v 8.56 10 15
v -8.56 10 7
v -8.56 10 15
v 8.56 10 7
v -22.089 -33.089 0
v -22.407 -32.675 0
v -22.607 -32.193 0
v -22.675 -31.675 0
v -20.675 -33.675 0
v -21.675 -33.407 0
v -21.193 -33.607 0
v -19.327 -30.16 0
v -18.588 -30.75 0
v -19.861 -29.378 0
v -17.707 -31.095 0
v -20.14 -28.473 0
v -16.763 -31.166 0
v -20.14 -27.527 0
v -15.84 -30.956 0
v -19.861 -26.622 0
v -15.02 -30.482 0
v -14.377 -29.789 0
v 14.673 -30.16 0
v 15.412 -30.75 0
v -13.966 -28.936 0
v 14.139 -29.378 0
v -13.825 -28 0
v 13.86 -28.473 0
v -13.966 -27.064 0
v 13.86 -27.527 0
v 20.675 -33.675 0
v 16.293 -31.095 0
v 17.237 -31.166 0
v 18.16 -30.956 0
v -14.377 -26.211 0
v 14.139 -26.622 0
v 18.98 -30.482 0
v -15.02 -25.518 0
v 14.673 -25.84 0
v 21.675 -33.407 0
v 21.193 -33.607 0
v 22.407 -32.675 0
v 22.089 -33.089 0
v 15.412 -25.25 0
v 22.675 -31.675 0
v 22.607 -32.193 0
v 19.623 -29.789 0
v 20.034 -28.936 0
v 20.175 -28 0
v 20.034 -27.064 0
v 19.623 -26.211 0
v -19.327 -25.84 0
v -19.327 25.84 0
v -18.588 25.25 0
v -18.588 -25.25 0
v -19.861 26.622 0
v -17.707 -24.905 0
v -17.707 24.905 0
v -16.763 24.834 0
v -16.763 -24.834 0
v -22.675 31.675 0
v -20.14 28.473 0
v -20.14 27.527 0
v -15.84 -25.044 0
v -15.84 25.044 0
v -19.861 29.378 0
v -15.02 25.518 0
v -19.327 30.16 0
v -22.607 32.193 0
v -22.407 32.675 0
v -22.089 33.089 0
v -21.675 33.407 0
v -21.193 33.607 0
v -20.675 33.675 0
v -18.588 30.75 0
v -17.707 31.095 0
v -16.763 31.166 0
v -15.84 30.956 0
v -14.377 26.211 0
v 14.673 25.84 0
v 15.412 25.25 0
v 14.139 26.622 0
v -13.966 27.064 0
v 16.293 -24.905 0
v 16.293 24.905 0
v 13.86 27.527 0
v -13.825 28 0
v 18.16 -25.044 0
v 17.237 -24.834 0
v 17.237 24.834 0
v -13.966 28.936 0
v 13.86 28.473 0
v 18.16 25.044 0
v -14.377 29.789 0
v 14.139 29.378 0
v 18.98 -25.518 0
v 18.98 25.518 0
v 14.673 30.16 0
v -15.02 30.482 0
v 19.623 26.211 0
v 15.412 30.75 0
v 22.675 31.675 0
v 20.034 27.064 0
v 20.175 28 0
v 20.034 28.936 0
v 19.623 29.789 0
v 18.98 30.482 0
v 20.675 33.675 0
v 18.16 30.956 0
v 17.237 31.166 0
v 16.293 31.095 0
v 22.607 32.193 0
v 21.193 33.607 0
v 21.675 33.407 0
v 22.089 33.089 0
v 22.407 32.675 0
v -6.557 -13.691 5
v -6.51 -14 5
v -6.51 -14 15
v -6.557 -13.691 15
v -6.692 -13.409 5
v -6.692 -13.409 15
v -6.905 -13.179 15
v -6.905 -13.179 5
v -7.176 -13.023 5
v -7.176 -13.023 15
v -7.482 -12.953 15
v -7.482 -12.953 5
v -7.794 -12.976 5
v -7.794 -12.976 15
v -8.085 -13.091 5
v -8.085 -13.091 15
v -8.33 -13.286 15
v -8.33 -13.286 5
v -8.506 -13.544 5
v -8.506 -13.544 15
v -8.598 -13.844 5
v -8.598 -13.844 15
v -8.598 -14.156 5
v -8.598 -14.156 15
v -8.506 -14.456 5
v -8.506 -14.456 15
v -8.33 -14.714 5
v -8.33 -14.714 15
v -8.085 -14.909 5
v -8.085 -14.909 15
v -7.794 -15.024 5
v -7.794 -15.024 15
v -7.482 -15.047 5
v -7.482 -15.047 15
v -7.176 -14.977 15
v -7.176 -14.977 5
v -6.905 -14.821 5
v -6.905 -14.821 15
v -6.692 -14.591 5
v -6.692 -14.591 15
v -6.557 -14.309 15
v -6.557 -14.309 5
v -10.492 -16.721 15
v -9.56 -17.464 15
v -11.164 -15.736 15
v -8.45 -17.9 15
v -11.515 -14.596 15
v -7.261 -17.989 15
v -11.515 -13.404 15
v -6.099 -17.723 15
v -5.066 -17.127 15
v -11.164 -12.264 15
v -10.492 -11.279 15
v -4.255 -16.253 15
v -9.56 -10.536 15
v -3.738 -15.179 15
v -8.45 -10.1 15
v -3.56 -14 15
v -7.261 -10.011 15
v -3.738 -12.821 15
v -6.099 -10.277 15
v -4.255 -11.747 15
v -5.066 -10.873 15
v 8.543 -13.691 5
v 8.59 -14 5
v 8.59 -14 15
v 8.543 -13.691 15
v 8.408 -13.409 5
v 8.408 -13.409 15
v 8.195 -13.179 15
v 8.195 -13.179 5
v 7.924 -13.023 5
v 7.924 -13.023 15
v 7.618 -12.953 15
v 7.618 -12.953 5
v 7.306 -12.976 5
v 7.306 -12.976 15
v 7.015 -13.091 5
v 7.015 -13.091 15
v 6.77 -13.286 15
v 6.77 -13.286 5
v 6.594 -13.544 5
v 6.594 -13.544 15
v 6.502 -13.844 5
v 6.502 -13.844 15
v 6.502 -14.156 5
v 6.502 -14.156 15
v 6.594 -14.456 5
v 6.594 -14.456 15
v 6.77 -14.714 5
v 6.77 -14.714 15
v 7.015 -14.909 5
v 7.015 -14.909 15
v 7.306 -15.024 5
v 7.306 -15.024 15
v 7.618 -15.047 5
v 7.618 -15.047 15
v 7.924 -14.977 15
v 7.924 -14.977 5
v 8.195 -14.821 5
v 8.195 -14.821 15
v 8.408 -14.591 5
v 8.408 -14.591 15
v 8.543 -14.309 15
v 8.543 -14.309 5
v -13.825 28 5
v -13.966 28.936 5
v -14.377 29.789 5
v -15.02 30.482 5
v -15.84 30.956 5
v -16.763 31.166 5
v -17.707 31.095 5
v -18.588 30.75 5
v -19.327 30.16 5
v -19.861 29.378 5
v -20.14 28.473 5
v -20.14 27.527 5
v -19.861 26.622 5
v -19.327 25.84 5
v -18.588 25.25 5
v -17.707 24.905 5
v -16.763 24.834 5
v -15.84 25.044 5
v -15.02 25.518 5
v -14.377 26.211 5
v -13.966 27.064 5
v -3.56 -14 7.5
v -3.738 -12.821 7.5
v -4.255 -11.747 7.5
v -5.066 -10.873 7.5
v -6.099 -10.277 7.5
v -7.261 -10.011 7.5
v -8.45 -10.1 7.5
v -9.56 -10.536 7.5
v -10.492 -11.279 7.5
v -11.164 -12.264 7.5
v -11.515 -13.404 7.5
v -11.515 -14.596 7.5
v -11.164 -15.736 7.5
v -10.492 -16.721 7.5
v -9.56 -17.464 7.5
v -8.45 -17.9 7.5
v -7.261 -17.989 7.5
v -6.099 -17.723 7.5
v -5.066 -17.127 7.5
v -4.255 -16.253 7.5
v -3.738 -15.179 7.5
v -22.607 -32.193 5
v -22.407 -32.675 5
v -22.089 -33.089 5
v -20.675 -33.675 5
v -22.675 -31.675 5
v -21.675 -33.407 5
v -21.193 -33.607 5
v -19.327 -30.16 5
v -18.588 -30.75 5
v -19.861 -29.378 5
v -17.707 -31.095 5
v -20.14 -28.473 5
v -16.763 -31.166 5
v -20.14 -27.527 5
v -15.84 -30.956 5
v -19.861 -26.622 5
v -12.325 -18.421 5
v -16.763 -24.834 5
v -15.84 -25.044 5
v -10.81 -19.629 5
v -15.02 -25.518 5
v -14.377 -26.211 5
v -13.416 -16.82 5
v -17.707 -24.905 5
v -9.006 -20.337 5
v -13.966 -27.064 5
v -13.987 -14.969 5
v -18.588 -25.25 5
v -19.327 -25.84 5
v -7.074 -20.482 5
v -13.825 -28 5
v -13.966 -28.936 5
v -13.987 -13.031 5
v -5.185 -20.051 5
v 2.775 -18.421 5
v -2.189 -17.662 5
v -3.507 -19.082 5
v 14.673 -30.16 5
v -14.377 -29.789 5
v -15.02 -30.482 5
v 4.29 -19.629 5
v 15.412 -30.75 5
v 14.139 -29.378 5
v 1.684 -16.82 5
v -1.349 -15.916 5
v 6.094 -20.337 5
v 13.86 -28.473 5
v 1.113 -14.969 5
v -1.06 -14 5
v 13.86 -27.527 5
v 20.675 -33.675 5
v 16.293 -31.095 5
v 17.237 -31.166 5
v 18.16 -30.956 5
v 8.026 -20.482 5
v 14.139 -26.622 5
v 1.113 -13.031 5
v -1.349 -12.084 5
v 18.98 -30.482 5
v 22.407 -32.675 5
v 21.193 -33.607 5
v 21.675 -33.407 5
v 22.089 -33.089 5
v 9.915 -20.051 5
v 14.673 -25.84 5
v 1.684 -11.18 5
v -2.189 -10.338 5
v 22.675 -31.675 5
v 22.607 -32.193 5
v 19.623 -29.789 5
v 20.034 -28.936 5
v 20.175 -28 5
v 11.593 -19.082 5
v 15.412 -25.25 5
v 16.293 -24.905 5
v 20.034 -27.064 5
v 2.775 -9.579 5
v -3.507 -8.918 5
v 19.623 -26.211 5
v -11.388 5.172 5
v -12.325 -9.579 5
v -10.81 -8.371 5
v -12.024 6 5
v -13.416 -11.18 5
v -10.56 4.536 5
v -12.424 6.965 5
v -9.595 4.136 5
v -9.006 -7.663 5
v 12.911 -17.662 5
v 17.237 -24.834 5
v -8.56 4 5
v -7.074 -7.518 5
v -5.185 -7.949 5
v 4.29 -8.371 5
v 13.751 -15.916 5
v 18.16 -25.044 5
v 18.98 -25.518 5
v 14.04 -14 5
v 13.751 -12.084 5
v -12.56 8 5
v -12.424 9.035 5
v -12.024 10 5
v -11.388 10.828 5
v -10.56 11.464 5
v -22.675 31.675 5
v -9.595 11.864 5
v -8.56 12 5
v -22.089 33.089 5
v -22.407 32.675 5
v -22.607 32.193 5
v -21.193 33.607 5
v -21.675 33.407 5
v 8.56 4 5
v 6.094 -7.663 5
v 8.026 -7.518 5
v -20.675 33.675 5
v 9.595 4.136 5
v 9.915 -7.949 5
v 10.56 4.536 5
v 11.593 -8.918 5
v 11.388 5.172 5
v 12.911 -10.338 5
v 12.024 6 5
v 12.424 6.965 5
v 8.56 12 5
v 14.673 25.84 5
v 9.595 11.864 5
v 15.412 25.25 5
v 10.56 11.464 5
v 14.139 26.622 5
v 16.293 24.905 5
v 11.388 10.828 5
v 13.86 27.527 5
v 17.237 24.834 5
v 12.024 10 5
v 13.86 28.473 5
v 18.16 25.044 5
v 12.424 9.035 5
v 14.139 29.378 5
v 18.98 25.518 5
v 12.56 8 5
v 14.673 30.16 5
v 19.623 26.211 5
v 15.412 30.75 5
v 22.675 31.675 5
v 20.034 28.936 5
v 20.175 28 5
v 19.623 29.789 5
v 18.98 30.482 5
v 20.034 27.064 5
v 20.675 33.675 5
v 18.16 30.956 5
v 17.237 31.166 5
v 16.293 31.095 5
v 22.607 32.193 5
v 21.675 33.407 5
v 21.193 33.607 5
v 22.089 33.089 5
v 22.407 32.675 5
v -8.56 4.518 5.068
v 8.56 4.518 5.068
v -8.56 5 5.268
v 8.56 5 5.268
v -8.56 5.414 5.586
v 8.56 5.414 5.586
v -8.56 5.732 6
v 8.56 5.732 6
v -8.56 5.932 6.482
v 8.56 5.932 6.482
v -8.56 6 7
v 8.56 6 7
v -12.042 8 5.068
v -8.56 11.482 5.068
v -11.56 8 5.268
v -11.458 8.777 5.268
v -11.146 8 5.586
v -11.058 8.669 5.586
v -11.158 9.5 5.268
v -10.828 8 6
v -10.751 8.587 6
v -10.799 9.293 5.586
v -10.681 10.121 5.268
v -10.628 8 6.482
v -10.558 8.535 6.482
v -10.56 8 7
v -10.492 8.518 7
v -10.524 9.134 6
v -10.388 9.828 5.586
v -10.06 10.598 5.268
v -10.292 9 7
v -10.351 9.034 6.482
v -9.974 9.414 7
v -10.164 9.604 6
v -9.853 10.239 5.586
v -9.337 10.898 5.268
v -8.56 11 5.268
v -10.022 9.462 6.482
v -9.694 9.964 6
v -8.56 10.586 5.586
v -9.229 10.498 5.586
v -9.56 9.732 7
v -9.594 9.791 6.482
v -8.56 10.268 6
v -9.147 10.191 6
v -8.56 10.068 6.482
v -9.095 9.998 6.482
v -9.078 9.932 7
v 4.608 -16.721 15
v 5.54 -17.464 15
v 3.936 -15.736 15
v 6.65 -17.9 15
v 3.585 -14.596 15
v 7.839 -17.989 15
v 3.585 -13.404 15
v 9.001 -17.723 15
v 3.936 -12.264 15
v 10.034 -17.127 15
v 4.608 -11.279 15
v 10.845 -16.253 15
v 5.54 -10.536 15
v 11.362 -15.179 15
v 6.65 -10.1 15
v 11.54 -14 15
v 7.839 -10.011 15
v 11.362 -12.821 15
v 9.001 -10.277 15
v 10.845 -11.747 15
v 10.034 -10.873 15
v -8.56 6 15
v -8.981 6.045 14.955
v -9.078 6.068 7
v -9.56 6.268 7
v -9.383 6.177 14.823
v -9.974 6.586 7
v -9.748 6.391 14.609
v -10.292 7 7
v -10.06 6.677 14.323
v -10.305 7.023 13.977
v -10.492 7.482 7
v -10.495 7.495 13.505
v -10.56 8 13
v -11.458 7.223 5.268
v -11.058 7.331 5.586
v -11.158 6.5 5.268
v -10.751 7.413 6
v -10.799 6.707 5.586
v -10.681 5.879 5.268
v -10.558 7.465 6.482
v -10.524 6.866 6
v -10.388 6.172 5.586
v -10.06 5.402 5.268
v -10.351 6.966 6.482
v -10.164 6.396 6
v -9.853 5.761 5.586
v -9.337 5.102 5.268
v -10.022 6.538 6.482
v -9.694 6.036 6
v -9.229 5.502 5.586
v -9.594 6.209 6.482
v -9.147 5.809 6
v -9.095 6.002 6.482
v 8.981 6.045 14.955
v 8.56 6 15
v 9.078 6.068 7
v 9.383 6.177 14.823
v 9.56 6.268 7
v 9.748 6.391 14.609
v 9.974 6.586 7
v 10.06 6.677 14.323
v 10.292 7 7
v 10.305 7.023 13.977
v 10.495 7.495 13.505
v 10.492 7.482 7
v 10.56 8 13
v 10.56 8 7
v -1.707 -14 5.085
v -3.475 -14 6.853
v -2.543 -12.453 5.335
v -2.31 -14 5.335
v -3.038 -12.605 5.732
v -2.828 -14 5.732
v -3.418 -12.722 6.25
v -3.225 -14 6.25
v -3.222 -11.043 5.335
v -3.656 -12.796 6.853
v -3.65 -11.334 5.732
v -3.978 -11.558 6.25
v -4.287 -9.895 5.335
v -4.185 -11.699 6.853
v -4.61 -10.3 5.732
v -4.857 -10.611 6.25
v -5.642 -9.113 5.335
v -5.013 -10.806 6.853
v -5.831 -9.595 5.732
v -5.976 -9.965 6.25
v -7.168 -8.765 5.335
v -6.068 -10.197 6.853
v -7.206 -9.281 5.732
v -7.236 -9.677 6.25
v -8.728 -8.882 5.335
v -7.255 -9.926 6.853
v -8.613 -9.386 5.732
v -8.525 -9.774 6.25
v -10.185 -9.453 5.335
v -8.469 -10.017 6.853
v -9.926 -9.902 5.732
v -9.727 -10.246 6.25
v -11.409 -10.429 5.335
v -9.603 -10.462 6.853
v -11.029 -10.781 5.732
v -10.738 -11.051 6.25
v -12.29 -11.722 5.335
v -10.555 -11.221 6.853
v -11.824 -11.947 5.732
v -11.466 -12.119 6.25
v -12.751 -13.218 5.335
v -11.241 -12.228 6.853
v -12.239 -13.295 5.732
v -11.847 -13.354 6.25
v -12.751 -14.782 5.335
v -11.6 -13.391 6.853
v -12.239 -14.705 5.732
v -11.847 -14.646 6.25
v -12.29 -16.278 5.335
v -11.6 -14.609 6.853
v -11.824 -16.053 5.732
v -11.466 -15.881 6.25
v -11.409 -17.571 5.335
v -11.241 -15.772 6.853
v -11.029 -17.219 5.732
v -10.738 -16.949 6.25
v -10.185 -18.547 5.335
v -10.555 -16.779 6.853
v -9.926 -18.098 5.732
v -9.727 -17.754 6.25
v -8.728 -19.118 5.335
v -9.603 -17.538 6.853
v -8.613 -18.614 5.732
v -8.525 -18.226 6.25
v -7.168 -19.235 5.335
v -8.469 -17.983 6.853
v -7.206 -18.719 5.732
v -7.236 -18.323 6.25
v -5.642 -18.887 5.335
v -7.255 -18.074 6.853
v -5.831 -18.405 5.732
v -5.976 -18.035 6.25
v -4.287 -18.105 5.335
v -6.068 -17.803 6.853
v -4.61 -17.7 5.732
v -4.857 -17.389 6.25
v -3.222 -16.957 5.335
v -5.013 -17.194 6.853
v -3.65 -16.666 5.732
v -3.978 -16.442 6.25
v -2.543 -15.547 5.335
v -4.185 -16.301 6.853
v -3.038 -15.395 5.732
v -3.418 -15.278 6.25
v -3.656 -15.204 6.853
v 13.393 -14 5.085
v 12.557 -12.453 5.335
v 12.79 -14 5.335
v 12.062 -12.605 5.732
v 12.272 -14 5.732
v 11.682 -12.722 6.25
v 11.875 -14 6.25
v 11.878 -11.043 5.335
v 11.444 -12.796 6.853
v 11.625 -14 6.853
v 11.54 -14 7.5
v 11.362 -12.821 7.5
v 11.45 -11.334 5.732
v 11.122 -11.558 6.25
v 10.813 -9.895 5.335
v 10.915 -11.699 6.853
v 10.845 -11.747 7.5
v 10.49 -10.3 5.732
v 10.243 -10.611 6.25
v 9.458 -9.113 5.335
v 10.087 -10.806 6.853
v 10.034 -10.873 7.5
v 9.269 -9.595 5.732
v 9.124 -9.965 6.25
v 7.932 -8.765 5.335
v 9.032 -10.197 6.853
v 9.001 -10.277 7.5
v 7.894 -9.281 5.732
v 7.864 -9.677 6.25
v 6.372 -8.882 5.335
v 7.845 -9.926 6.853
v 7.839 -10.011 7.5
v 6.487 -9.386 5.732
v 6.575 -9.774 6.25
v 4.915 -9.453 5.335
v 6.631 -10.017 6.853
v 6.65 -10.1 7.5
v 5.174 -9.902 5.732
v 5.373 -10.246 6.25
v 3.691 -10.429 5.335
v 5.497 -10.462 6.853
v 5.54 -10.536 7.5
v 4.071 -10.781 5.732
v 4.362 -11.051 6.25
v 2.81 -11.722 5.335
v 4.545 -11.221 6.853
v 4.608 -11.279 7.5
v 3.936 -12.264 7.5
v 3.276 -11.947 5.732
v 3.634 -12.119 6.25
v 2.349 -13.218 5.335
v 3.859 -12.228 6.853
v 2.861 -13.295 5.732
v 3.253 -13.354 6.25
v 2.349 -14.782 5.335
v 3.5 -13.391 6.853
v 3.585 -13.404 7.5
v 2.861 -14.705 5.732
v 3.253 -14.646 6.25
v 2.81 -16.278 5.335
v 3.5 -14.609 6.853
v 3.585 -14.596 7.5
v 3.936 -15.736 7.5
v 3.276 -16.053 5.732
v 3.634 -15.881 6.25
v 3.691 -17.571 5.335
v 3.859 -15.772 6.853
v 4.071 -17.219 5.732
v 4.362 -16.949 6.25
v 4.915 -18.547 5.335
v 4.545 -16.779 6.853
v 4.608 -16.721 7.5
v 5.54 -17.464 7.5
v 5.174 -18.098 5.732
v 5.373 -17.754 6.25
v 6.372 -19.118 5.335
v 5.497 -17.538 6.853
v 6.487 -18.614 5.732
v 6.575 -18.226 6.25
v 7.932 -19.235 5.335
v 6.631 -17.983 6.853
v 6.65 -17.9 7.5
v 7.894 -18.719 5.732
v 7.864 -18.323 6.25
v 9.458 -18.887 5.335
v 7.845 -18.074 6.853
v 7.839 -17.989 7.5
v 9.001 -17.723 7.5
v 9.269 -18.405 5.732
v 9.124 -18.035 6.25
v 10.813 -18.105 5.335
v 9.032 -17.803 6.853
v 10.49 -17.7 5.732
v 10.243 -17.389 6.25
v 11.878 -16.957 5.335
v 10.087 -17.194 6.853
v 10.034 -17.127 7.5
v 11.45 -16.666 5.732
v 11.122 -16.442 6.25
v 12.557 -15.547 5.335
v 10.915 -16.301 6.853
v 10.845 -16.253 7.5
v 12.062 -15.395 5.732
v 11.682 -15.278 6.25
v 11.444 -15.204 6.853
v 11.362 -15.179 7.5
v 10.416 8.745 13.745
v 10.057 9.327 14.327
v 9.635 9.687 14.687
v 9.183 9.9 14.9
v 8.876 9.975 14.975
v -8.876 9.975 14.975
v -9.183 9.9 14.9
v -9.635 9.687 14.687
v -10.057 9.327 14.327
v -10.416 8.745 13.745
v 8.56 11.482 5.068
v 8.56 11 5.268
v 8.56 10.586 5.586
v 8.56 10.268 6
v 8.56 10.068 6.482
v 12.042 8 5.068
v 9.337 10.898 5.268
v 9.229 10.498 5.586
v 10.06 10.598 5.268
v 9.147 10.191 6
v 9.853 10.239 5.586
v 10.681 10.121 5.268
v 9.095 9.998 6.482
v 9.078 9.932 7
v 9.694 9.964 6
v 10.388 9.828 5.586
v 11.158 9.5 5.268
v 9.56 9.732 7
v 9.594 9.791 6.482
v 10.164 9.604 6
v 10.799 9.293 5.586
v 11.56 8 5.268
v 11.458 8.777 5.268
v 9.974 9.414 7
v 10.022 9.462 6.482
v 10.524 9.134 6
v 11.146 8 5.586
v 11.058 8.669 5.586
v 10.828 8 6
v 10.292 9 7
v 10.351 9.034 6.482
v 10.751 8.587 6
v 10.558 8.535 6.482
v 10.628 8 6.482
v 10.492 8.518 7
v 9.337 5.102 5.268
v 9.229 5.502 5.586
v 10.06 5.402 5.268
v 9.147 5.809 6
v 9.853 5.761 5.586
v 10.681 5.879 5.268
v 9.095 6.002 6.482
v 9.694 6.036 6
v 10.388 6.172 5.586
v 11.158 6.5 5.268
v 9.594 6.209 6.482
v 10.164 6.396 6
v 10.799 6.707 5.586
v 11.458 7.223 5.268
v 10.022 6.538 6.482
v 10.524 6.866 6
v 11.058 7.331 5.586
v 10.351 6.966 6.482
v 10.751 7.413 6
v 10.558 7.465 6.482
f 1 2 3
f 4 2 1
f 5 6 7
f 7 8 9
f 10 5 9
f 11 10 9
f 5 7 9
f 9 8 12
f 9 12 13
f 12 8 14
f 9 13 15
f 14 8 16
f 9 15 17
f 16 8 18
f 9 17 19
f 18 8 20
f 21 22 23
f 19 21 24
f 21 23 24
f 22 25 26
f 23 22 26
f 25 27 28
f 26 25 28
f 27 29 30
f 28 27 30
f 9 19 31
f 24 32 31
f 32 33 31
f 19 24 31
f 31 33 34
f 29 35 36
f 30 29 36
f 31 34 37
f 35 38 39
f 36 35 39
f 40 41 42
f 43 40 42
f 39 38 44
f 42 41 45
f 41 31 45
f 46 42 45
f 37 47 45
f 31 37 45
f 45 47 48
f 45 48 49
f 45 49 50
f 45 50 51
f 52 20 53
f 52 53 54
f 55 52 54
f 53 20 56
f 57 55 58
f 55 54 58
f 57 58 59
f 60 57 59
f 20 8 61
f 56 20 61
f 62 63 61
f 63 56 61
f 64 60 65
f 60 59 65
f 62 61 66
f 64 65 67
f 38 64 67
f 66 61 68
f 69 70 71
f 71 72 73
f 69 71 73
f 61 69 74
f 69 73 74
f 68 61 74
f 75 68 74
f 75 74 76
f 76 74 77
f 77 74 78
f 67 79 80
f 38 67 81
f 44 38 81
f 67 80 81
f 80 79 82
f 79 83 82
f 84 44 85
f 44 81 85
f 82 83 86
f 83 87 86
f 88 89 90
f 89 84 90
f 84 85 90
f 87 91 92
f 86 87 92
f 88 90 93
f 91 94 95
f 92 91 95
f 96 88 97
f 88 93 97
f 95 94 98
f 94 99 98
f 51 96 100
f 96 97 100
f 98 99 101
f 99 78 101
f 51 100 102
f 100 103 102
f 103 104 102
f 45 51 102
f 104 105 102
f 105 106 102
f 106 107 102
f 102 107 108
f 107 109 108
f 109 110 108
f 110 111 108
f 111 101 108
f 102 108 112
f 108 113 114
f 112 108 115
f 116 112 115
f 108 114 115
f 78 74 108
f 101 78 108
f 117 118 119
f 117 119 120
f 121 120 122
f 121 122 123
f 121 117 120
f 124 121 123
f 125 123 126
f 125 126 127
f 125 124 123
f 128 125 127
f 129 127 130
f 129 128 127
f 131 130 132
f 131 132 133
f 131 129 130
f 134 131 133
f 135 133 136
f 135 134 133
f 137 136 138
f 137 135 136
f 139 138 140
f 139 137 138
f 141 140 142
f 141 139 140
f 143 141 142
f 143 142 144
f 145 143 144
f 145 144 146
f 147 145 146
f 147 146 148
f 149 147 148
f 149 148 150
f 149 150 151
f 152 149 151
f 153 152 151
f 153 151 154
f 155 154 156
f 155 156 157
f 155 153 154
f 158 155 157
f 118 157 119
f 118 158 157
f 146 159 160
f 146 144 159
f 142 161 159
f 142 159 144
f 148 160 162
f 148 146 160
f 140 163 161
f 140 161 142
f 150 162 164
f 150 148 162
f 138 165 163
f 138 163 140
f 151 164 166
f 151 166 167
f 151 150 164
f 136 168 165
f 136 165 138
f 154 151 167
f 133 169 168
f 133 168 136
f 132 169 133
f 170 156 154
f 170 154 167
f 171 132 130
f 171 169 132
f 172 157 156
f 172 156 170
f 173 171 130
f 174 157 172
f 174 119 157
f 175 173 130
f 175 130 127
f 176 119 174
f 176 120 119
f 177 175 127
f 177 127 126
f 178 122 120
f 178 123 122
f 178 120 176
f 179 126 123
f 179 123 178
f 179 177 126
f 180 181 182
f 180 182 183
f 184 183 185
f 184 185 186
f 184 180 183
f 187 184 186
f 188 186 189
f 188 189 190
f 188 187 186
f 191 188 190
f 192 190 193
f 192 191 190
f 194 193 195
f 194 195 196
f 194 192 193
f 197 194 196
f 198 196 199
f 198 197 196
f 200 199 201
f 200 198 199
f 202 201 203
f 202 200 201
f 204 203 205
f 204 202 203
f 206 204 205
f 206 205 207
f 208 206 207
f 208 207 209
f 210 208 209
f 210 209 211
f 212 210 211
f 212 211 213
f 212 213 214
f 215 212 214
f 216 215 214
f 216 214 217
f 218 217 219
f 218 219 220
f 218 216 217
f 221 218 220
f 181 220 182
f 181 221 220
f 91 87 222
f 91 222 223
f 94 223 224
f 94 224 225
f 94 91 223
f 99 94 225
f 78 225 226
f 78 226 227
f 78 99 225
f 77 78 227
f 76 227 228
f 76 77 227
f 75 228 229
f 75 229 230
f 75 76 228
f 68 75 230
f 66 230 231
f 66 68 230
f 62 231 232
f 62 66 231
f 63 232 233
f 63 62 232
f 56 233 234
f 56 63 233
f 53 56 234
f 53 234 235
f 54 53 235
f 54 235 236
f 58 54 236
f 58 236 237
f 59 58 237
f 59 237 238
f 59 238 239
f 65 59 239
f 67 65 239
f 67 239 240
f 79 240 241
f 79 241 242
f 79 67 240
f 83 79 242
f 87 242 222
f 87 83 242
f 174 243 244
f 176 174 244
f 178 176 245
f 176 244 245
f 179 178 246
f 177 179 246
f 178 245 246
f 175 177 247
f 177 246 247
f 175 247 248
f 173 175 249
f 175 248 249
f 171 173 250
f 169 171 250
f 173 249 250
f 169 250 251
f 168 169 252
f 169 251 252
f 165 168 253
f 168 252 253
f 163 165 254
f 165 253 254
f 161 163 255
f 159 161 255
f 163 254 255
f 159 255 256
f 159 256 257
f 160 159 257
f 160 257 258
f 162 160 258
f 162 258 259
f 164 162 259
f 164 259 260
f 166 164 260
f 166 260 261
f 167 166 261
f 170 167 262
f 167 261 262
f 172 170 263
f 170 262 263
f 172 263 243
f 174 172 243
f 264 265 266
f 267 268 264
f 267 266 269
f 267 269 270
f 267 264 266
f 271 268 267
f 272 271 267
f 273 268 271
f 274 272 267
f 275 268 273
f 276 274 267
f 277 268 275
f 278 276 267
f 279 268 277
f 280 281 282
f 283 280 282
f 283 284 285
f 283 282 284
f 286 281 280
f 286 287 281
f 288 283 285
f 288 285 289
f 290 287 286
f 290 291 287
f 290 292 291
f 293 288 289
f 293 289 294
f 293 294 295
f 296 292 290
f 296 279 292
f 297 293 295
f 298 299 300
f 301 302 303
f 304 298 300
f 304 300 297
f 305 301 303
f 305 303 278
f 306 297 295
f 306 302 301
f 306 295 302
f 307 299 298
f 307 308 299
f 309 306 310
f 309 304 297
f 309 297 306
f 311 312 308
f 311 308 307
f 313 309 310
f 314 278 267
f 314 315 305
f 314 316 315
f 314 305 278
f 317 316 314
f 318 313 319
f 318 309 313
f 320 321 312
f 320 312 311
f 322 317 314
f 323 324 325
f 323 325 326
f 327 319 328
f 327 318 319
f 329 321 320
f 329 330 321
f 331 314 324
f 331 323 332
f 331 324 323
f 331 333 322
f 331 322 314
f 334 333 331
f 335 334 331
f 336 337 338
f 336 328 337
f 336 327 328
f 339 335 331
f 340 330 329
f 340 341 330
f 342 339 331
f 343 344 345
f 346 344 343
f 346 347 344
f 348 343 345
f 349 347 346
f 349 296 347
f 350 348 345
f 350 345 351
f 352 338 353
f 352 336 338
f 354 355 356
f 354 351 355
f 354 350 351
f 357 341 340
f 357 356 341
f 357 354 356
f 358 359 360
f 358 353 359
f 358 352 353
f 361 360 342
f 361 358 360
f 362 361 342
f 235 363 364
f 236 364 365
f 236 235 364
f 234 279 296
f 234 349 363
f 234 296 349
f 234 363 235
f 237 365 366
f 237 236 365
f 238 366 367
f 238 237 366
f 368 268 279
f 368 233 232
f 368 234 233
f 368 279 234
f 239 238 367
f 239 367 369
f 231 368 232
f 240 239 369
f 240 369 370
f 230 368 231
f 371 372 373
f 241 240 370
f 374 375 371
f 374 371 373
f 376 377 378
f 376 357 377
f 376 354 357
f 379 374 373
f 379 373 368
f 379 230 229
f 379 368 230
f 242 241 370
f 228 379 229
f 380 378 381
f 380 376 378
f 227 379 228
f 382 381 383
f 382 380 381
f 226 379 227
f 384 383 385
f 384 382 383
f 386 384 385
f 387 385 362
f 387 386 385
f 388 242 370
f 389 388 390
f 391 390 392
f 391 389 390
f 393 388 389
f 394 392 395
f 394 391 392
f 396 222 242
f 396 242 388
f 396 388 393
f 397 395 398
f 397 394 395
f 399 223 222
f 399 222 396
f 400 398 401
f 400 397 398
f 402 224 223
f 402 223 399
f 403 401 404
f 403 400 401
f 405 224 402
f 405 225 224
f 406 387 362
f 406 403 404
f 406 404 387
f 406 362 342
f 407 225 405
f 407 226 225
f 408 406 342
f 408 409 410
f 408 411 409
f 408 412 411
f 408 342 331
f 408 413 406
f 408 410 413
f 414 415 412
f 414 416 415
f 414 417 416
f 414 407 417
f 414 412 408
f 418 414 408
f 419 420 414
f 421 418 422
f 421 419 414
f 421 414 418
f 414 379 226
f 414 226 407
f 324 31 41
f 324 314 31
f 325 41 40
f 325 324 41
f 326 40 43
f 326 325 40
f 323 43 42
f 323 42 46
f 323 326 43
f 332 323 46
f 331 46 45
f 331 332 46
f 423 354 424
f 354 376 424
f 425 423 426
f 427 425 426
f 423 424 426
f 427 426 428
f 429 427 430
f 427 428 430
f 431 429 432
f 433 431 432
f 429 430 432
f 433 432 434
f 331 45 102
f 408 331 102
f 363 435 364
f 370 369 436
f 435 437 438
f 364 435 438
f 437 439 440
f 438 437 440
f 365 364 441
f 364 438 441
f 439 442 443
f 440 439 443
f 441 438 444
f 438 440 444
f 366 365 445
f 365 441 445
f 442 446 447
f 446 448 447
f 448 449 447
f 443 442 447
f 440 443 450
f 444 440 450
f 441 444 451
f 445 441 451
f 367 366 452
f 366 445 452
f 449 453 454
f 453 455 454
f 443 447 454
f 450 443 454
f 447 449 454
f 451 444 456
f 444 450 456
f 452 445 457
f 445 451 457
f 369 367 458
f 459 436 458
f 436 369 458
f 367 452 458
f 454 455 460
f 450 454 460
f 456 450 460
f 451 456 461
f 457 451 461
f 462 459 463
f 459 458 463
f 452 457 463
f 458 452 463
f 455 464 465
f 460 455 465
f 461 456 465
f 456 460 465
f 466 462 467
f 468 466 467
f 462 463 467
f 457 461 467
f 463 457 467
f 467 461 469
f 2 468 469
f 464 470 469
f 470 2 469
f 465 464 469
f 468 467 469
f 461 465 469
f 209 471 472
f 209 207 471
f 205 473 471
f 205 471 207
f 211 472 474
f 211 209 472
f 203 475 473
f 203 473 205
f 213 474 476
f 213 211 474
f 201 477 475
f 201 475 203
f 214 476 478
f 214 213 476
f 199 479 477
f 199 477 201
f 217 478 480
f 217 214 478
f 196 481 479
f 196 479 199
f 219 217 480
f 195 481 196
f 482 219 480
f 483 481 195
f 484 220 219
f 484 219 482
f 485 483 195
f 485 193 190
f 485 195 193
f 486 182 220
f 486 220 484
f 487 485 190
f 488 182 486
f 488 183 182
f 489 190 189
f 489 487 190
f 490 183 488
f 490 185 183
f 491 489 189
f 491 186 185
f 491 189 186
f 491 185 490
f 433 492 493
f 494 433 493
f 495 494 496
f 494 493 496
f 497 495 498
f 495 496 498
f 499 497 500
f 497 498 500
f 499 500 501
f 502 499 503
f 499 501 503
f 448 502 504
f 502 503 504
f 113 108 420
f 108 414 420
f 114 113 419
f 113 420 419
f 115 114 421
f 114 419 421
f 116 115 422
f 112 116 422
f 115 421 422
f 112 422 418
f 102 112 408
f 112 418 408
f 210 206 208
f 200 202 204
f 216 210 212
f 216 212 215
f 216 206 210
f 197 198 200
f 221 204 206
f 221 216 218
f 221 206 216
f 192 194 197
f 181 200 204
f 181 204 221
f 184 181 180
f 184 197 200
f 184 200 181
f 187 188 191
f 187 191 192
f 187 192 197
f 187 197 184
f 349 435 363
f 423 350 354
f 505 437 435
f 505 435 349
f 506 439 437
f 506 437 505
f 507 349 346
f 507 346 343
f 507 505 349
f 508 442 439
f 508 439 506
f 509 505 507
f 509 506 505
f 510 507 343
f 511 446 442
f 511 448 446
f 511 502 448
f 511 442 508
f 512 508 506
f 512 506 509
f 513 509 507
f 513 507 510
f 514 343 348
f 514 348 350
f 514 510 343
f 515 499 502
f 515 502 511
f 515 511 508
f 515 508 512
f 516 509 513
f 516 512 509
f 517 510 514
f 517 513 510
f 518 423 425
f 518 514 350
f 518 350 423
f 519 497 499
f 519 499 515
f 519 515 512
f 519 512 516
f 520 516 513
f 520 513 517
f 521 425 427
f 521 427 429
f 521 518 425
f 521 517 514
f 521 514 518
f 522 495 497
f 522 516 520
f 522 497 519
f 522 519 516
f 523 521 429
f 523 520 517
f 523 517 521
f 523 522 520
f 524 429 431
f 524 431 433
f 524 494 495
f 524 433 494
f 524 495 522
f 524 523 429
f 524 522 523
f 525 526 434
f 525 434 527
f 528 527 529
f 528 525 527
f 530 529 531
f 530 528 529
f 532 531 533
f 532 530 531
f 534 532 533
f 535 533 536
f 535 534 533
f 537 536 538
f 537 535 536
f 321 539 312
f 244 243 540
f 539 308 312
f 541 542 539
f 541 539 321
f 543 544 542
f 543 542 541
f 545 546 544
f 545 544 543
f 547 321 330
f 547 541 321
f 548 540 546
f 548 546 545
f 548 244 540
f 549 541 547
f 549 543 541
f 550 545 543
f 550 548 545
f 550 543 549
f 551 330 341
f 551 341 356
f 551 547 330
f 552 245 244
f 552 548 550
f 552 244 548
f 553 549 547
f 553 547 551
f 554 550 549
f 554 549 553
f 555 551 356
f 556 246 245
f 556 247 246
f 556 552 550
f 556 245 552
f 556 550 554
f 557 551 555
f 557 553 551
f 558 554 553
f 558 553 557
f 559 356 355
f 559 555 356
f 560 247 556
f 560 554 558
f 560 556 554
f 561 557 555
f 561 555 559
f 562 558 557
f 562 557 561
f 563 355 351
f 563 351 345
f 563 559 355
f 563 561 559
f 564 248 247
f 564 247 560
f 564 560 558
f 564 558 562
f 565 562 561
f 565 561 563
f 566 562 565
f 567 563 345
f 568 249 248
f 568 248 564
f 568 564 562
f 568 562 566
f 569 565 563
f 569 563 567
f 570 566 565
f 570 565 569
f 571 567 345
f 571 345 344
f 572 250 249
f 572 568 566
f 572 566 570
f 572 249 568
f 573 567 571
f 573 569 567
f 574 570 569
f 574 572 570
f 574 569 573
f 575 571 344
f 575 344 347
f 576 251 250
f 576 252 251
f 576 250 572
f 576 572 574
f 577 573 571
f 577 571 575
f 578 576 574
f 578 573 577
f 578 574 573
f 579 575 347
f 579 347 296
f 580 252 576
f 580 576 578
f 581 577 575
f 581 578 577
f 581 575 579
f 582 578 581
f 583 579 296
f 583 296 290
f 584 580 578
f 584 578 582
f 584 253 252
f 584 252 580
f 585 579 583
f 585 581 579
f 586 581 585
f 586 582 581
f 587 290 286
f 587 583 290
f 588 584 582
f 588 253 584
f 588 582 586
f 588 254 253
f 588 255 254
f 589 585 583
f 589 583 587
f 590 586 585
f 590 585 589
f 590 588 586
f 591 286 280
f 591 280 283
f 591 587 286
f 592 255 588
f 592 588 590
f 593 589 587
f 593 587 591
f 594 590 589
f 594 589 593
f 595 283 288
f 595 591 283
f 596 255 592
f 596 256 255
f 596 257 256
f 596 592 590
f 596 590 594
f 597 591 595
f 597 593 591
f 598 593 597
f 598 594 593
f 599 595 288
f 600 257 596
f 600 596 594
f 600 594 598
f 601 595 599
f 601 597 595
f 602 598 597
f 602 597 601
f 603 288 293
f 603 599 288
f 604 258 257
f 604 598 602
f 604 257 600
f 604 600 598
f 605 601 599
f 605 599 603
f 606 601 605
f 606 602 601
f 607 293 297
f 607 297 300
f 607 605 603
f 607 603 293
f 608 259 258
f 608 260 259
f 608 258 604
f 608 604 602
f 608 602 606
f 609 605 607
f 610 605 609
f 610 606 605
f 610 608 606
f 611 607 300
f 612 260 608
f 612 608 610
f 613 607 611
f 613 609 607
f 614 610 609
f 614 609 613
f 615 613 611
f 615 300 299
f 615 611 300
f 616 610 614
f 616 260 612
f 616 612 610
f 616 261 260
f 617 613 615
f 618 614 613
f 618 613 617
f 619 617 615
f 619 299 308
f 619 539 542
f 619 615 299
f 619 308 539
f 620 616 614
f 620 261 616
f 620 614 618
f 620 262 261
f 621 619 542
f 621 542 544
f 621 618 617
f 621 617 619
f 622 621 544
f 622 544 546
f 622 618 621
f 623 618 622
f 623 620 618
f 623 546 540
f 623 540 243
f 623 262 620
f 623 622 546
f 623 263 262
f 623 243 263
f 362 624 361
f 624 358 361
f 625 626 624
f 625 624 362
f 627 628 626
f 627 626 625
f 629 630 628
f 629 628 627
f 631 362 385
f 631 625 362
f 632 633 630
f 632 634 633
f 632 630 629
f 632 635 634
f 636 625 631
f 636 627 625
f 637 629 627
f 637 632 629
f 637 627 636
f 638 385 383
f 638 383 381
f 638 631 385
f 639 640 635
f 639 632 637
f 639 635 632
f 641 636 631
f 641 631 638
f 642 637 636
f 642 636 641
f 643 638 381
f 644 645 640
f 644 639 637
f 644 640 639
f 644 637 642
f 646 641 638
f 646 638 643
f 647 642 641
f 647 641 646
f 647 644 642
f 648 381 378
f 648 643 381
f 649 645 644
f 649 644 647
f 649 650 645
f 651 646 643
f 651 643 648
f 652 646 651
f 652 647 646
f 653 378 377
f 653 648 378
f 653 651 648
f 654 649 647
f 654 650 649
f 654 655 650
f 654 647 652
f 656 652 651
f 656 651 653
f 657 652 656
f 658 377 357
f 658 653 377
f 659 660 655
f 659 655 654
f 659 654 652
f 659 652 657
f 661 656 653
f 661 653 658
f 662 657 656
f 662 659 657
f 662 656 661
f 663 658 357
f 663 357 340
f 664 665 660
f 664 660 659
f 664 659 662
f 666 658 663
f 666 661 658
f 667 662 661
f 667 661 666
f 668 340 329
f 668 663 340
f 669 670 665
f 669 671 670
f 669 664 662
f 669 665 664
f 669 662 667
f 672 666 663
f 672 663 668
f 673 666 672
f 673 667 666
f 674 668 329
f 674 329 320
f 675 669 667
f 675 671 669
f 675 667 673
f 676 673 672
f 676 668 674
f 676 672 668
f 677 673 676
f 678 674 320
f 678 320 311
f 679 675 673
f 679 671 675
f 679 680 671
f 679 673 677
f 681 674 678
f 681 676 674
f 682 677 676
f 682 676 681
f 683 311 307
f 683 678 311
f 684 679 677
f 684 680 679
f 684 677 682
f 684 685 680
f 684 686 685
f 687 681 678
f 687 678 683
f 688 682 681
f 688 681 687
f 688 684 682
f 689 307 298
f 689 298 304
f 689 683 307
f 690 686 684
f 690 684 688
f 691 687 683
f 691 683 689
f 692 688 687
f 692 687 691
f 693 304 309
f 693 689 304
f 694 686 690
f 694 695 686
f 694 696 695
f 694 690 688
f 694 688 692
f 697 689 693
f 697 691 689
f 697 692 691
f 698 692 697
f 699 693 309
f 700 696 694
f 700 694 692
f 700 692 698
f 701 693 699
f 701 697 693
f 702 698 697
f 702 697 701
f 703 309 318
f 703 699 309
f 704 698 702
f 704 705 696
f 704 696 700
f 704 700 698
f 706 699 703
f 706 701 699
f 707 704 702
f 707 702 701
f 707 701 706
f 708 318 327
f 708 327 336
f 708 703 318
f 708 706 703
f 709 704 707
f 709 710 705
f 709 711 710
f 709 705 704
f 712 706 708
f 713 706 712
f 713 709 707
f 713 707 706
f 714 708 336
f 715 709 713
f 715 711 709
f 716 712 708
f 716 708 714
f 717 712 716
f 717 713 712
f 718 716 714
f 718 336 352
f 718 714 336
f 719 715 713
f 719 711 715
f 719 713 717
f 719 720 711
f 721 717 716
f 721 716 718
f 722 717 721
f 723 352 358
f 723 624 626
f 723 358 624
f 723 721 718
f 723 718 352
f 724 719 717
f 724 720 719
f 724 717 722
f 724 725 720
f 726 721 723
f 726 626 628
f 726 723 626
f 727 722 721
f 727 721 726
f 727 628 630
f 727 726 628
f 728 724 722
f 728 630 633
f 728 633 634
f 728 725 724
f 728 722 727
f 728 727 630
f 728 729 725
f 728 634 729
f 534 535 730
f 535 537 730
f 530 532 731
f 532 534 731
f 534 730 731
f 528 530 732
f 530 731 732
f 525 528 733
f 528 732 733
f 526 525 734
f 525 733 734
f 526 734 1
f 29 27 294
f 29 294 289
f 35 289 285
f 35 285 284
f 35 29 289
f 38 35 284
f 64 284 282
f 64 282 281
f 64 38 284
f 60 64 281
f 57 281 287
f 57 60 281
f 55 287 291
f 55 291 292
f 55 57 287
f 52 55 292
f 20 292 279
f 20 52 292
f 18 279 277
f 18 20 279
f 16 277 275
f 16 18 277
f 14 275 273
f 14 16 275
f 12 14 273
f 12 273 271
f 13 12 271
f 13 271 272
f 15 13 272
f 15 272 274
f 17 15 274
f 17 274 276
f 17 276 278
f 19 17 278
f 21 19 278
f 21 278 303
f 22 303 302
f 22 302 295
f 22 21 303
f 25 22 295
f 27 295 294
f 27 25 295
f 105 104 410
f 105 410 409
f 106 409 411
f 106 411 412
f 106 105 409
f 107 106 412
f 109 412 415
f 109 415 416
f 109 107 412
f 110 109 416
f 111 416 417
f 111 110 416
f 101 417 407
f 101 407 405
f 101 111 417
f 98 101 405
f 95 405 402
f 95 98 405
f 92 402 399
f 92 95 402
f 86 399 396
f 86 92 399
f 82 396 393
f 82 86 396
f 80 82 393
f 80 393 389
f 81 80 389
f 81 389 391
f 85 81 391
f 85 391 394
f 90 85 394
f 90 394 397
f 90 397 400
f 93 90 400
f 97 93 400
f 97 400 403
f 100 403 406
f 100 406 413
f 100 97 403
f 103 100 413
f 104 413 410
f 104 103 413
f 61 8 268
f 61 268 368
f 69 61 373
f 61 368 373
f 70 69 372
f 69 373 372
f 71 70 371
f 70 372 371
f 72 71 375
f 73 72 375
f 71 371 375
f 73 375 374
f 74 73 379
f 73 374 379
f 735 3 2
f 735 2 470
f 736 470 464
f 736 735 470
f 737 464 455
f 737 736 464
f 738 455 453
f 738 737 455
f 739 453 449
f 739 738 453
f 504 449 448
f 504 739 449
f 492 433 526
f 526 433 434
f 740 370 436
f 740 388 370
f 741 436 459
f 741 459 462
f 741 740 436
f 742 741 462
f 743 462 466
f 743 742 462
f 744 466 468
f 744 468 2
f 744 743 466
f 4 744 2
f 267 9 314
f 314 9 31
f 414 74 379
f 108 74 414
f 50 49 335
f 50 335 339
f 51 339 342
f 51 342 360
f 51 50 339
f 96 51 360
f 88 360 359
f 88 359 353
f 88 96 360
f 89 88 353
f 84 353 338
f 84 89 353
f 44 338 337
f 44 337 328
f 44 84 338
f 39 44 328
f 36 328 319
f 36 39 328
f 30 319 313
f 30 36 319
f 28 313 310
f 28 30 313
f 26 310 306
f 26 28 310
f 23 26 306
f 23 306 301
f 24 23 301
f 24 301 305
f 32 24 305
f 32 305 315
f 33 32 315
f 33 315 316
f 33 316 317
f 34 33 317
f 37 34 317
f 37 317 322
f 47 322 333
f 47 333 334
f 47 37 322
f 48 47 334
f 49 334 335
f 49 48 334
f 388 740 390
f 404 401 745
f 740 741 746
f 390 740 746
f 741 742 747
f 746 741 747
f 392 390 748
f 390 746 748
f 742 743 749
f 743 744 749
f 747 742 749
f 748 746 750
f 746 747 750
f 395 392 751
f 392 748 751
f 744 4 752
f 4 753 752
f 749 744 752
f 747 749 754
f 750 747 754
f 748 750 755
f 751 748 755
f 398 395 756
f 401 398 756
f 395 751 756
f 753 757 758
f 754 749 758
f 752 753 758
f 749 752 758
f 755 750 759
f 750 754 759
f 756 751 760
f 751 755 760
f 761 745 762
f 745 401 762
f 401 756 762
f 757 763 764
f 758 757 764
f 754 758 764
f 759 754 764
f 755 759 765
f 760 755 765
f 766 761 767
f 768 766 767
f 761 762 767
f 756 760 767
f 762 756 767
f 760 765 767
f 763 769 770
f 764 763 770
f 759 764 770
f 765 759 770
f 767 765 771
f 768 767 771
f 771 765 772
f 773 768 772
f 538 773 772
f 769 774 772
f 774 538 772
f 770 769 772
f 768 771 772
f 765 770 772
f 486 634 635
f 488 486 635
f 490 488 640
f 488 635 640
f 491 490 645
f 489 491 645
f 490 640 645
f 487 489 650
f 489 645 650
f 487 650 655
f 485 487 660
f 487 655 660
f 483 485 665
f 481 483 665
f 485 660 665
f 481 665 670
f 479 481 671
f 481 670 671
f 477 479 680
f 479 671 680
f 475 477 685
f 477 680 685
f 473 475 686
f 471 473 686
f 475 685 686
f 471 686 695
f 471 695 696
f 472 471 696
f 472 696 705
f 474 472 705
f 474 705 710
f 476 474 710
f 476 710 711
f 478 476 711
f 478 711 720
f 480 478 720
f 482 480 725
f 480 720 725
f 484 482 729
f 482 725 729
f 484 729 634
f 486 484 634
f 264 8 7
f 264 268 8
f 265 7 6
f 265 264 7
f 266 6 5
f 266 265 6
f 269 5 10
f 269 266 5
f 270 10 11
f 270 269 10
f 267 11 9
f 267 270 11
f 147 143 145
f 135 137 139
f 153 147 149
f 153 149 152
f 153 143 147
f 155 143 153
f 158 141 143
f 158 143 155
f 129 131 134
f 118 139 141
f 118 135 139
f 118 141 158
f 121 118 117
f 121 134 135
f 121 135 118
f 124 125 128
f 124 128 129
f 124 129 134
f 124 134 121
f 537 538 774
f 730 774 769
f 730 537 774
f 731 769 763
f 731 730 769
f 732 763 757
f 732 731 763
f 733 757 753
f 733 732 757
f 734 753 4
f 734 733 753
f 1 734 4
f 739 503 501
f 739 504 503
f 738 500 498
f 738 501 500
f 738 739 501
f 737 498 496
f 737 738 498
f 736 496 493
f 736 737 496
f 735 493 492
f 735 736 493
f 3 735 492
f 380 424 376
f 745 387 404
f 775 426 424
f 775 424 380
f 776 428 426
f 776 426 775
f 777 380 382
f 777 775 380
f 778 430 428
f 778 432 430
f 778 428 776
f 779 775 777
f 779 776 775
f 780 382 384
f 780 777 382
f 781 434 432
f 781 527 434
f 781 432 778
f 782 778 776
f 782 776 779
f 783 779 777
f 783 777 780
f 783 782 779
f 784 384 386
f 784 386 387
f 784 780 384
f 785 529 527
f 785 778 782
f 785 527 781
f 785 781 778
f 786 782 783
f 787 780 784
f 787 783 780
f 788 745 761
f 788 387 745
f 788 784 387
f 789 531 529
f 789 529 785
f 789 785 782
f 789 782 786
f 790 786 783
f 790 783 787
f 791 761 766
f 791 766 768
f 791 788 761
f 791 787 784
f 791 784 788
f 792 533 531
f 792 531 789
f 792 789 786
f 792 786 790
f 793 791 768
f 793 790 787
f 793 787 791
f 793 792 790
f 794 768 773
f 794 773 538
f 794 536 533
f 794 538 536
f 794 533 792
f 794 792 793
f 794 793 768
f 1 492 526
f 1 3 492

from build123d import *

# Parameters (mm, degrees)
SKETCH1_W           = 45.35
SKETCH1_H           = 67.35
SKETCH1_R           = 3.175
BOSS_EXTRUDE1_DEPTH = 5
SKETCH2_R           = 4
SKETCH2_R_2         = 1.05
SKETCH2_W           = 21.12
SKETCH2_H           = 4
BOSS_EXTRUDE2_DEPTH = 10
FILLET1_R           = 2
FILLET2_R           = 2
FILLET3_R           = 2.5


with BuildPart() as part:
    # Sketch1 → Boss-Extrude1 (new body)
    with BuildSketch(Plane.XY):
        Rectangle(SKETCH1_W, SKETCH1_H)
        with Locations((-17, 28)):
            Circle(SKETCH1_R, mode=Mode.SUBTRACT)
        with Locations((17, 28)):
            Circle(SKETCH1_R, mode=Mode.SUBTRACT)
        with Locations((17, -28)):
            Circle(SKETCH1_R, mode=Mode.SUBTRACT)
        with Locations((-17, -28)):
            Circle(SKETCH1_R, mode=Mode.SUBTRACT)
    extrude(amount=BOSS_EXTRUDE1_DEPTH)

    # Sketch2 → Boss-Extrude2 (add)
    # profile 1 of 3: a face of its own
    with BuildSketch(Plane.XY.offset(5)):
        with Locations((7.54, -14)):
            Circle(SKETCH2_R)
        with Locations((7.54, -14)):
            Circle(SKETCH2_R_2, mode=Mode.SUBTRACT)
    # profile 2 of 3: a face of its own
    with BuildSketch(Plane.XY.offset(5)):
        with Locations((-7.56, -14)):
            Circle(SKETCH2_R)
        with Locations((-7.56, -14)):
            Circle(SKETCH2_R_2, mode=Mode.SUBTRACT)
    # profile 3 of 3: a face of its own
    with BuildSketch(Plane.XY.offset(5)):
        with Locations((0, 8)):
            Rectangle(SKETCH2_W, SKETCH2_H)
    extrude(amount=BOSS_EXTRUDE2_DEPTH)

    # Fillet1
    fillet1_edges = [part.edges().sort_by_distance(p)[0] for p in [
        (22.675, -33.675, 2.5),
        (-22.675, -33.675, 2.5),
        (-22.675, 33.675, 2.5),
        (22.675, 33.675, 2.5),
    ]]
    fillet(fillet1_edges, radius=FILLET1_R)

    # Fillet2
    fillet2_edges = [part.edges().sort_by_distance(p)[0] for p in [
        (0, 6, 5),
        (-10.56, 6, 10),
        (10.56, 8, 5),
        (10.56, 6, 10),
        (10.56, 10, 10),
        (-10.56, 8, 15),
        (-10.56, 10, 10),
        (10.56, 8, 15),
        (-10.56, 8, 5),
        (0, 10, 5),
    ]]
    fillet(fillet2_edges, radius=FILLET2_R - 0.0001)  # a hair under: the kernel refuses the full size

    # Fillet3
    fillet3_edges = [part.edges().sort_by_distance(p)[0] for p in [
        (3.54, -14, 5),
        (-11.56, -14, 5),
    ]]
    fillet(fillet3_edges, radius=FILLET3_R)


solid = part.part
